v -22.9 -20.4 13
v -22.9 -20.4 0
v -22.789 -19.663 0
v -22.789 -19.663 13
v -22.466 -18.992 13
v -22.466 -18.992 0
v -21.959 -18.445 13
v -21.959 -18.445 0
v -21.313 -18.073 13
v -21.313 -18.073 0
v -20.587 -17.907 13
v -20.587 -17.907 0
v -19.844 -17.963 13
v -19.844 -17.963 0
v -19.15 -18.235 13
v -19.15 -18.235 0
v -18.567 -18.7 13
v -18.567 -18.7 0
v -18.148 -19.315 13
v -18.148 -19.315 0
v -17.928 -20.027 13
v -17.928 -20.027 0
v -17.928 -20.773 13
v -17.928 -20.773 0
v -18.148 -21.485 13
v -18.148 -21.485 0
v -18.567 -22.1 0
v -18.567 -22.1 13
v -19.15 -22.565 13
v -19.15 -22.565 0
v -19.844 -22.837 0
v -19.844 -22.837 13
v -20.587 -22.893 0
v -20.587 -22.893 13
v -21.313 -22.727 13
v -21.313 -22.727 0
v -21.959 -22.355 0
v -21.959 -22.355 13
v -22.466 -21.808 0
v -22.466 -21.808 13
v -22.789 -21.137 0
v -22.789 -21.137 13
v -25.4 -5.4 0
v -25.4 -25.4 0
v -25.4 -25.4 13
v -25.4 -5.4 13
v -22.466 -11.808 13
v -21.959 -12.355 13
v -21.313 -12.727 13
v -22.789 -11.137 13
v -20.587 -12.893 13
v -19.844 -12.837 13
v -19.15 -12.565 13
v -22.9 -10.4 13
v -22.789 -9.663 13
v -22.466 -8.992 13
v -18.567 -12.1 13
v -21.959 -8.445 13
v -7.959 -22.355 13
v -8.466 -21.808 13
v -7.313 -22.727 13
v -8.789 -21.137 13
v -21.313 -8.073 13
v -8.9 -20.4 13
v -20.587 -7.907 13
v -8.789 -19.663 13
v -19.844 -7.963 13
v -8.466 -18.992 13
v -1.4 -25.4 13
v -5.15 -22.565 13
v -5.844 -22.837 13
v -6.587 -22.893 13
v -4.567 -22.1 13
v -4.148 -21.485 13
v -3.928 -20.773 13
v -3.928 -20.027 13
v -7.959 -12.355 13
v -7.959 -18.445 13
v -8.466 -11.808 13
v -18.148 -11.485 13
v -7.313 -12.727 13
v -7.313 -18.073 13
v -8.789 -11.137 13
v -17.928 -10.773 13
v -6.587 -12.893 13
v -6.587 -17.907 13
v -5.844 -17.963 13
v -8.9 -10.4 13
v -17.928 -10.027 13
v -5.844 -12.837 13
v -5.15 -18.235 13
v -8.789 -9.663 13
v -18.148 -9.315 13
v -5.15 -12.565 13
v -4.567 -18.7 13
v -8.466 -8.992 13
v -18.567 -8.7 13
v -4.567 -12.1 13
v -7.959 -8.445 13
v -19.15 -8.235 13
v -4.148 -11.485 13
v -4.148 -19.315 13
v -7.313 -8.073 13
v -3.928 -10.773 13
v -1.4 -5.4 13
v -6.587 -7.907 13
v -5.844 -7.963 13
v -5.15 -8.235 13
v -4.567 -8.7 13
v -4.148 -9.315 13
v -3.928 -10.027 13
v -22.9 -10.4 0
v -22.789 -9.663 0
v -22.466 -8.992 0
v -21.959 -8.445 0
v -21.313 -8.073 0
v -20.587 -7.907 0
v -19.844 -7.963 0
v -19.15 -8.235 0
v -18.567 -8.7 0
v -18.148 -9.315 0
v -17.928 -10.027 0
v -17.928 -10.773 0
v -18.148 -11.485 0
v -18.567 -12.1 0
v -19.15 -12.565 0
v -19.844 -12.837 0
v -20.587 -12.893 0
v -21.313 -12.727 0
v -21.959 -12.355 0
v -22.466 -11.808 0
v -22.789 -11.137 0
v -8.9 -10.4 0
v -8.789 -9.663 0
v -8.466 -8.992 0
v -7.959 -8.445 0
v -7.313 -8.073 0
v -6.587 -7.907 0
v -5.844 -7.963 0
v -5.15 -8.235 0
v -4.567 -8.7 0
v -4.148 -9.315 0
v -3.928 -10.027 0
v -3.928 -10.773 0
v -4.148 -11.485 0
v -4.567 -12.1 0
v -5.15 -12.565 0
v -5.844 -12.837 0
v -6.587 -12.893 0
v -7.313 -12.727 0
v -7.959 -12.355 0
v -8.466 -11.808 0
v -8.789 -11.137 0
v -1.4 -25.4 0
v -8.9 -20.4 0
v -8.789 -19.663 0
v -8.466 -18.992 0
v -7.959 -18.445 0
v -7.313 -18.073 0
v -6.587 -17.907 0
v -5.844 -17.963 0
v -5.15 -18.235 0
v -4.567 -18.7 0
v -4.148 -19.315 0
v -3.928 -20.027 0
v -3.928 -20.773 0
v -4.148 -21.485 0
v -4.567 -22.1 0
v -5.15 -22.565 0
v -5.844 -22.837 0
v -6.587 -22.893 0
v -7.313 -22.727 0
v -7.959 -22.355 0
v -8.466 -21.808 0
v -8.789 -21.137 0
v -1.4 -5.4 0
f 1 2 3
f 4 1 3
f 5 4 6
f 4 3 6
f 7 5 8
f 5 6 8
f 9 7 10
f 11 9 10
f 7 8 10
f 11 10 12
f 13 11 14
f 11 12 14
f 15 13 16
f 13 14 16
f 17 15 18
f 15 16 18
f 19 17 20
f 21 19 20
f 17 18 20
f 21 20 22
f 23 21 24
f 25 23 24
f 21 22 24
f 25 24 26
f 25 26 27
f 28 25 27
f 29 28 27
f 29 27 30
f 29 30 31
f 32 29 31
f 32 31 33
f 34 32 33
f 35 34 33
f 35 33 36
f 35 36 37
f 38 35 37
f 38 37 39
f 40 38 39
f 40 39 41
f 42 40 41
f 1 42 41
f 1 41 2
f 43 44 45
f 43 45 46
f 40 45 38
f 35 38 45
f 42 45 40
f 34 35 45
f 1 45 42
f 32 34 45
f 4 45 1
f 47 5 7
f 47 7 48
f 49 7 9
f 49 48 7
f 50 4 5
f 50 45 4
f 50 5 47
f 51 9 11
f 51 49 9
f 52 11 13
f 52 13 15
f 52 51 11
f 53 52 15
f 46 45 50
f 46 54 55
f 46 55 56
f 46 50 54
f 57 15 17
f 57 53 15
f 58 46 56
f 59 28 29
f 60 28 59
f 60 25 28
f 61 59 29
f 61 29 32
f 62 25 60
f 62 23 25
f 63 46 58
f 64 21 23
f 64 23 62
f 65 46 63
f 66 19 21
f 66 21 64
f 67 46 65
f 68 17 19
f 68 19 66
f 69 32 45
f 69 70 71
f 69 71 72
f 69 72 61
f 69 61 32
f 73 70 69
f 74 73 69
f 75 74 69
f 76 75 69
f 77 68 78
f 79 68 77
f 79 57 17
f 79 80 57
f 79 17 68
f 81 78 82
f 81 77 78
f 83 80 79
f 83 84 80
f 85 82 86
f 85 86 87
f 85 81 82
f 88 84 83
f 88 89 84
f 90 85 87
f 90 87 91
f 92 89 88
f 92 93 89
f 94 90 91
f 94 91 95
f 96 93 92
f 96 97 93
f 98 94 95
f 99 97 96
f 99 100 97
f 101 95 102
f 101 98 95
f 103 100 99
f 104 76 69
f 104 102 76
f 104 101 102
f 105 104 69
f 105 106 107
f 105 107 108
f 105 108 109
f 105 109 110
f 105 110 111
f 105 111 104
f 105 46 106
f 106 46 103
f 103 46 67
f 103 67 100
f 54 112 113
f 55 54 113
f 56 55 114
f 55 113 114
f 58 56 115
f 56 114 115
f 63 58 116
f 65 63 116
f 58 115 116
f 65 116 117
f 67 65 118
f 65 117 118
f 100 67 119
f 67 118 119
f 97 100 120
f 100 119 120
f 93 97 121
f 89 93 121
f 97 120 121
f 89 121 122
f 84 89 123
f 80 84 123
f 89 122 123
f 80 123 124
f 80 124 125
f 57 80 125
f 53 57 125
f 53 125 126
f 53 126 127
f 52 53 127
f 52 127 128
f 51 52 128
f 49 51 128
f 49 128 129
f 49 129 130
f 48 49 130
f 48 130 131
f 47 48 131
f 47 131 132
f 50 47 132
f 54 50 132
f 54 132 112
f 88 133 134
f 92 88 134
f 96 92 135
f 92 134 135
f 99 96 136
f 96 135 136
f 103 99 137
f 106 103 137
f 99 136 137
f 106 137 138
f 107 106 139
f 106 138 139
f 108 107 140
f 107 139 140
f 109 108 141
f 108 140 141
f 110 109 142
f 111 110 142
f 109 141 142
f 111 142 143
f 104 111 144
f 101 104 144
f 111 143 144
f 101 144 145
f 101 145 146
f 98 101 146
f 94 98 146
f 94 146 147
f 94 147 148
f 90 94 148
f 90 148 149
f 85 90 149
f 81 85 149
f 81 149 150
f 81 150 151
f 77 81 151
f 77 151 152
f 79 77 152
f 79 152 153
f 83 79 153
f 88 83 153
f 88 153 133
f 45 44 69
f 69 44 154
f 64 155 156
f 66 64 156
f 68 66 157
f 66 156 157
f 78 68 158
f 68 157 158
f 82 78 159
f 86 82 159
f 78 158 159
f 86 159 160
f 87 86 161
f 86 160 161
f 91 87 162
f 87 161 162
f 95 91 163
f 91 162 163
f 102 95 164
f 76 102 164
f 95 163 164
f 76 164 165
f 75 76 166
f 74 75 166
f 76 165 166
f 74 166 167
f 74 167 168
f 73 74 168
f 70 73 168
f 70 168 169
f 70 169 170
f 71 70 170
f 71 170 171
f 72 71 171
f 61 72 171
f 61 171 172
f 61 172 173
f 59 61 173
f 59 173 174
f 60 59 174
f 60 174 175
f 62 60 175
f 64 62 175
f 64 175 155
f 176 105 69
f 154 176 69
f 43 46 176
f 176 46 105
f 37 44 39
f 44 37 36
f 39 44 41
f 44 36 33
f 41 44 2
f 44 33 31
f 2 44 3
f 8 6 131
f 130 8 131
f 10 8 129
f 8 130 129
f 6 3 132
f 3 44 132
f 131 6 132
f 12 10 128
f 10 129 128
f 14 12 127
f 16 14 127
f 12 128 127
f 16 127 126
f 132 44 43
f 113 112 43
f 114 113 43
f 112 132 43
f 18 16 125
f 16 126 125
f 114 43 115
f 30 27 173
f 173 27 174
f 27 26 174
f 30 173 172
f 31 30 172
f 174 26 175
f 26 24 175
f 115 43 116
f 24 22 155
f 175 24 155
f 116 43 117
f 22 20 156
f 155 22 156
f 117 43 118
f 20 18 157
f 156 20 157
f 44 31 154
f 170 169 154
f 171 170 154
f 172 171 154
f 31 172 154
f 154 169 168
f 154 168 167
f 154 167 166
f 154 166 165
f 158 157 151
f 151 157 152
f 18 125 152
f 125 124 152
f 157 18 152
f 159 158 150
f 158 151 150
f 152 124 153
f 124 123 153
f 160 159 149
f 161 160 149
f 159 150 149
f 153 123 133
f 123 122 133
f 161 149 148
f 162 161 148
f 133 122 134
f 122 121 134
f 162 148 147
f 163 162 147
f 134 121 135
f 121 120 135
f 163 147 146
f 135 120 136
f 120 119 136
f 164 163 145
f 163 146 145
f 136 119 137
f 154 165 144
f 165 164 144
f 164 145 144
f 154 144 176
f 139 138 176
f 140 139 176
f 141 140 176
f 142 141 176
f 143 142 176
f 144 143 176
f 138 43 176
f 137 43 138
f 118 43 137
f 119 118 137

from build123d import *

# Parameters (mm, degrees)
F0_W     = 50.8
F0_H     = 50.8
F1_DEPTH = 13
F3_DEPTH = 16
F5_D     = 5


with BuildPart() as f1:
    # F0 (on Top) → F1 (new body)
    with BuildSketch(Plane.XY):
        Rectangle(F0_W, F0_H)
    extrude(amount=F1_DEPTH)

    # F2 (on face) → F3 (cut)
    with BuildSketch(Plane.XY.offset(13)):
        Polygon((-1.4, -5.4), (-1.4, -25.4), (25.4, -25.4), (25.4, 25.4), (-25.4, 25.4), (-25.4, -5.4), align=None)
    extrude(amount=-F3_DEPTH, mode=Mode.SUBTRACT)

    # F5 (through all)
    with Locations(Plane.XY.offset(13)):
        with Locations((-20.4, -10.4), (-20.4, -20.4), (-6.4, -10.4), (-6.4, -20.4)):
            Hole(F5_D / 2)


solid = f1.part
